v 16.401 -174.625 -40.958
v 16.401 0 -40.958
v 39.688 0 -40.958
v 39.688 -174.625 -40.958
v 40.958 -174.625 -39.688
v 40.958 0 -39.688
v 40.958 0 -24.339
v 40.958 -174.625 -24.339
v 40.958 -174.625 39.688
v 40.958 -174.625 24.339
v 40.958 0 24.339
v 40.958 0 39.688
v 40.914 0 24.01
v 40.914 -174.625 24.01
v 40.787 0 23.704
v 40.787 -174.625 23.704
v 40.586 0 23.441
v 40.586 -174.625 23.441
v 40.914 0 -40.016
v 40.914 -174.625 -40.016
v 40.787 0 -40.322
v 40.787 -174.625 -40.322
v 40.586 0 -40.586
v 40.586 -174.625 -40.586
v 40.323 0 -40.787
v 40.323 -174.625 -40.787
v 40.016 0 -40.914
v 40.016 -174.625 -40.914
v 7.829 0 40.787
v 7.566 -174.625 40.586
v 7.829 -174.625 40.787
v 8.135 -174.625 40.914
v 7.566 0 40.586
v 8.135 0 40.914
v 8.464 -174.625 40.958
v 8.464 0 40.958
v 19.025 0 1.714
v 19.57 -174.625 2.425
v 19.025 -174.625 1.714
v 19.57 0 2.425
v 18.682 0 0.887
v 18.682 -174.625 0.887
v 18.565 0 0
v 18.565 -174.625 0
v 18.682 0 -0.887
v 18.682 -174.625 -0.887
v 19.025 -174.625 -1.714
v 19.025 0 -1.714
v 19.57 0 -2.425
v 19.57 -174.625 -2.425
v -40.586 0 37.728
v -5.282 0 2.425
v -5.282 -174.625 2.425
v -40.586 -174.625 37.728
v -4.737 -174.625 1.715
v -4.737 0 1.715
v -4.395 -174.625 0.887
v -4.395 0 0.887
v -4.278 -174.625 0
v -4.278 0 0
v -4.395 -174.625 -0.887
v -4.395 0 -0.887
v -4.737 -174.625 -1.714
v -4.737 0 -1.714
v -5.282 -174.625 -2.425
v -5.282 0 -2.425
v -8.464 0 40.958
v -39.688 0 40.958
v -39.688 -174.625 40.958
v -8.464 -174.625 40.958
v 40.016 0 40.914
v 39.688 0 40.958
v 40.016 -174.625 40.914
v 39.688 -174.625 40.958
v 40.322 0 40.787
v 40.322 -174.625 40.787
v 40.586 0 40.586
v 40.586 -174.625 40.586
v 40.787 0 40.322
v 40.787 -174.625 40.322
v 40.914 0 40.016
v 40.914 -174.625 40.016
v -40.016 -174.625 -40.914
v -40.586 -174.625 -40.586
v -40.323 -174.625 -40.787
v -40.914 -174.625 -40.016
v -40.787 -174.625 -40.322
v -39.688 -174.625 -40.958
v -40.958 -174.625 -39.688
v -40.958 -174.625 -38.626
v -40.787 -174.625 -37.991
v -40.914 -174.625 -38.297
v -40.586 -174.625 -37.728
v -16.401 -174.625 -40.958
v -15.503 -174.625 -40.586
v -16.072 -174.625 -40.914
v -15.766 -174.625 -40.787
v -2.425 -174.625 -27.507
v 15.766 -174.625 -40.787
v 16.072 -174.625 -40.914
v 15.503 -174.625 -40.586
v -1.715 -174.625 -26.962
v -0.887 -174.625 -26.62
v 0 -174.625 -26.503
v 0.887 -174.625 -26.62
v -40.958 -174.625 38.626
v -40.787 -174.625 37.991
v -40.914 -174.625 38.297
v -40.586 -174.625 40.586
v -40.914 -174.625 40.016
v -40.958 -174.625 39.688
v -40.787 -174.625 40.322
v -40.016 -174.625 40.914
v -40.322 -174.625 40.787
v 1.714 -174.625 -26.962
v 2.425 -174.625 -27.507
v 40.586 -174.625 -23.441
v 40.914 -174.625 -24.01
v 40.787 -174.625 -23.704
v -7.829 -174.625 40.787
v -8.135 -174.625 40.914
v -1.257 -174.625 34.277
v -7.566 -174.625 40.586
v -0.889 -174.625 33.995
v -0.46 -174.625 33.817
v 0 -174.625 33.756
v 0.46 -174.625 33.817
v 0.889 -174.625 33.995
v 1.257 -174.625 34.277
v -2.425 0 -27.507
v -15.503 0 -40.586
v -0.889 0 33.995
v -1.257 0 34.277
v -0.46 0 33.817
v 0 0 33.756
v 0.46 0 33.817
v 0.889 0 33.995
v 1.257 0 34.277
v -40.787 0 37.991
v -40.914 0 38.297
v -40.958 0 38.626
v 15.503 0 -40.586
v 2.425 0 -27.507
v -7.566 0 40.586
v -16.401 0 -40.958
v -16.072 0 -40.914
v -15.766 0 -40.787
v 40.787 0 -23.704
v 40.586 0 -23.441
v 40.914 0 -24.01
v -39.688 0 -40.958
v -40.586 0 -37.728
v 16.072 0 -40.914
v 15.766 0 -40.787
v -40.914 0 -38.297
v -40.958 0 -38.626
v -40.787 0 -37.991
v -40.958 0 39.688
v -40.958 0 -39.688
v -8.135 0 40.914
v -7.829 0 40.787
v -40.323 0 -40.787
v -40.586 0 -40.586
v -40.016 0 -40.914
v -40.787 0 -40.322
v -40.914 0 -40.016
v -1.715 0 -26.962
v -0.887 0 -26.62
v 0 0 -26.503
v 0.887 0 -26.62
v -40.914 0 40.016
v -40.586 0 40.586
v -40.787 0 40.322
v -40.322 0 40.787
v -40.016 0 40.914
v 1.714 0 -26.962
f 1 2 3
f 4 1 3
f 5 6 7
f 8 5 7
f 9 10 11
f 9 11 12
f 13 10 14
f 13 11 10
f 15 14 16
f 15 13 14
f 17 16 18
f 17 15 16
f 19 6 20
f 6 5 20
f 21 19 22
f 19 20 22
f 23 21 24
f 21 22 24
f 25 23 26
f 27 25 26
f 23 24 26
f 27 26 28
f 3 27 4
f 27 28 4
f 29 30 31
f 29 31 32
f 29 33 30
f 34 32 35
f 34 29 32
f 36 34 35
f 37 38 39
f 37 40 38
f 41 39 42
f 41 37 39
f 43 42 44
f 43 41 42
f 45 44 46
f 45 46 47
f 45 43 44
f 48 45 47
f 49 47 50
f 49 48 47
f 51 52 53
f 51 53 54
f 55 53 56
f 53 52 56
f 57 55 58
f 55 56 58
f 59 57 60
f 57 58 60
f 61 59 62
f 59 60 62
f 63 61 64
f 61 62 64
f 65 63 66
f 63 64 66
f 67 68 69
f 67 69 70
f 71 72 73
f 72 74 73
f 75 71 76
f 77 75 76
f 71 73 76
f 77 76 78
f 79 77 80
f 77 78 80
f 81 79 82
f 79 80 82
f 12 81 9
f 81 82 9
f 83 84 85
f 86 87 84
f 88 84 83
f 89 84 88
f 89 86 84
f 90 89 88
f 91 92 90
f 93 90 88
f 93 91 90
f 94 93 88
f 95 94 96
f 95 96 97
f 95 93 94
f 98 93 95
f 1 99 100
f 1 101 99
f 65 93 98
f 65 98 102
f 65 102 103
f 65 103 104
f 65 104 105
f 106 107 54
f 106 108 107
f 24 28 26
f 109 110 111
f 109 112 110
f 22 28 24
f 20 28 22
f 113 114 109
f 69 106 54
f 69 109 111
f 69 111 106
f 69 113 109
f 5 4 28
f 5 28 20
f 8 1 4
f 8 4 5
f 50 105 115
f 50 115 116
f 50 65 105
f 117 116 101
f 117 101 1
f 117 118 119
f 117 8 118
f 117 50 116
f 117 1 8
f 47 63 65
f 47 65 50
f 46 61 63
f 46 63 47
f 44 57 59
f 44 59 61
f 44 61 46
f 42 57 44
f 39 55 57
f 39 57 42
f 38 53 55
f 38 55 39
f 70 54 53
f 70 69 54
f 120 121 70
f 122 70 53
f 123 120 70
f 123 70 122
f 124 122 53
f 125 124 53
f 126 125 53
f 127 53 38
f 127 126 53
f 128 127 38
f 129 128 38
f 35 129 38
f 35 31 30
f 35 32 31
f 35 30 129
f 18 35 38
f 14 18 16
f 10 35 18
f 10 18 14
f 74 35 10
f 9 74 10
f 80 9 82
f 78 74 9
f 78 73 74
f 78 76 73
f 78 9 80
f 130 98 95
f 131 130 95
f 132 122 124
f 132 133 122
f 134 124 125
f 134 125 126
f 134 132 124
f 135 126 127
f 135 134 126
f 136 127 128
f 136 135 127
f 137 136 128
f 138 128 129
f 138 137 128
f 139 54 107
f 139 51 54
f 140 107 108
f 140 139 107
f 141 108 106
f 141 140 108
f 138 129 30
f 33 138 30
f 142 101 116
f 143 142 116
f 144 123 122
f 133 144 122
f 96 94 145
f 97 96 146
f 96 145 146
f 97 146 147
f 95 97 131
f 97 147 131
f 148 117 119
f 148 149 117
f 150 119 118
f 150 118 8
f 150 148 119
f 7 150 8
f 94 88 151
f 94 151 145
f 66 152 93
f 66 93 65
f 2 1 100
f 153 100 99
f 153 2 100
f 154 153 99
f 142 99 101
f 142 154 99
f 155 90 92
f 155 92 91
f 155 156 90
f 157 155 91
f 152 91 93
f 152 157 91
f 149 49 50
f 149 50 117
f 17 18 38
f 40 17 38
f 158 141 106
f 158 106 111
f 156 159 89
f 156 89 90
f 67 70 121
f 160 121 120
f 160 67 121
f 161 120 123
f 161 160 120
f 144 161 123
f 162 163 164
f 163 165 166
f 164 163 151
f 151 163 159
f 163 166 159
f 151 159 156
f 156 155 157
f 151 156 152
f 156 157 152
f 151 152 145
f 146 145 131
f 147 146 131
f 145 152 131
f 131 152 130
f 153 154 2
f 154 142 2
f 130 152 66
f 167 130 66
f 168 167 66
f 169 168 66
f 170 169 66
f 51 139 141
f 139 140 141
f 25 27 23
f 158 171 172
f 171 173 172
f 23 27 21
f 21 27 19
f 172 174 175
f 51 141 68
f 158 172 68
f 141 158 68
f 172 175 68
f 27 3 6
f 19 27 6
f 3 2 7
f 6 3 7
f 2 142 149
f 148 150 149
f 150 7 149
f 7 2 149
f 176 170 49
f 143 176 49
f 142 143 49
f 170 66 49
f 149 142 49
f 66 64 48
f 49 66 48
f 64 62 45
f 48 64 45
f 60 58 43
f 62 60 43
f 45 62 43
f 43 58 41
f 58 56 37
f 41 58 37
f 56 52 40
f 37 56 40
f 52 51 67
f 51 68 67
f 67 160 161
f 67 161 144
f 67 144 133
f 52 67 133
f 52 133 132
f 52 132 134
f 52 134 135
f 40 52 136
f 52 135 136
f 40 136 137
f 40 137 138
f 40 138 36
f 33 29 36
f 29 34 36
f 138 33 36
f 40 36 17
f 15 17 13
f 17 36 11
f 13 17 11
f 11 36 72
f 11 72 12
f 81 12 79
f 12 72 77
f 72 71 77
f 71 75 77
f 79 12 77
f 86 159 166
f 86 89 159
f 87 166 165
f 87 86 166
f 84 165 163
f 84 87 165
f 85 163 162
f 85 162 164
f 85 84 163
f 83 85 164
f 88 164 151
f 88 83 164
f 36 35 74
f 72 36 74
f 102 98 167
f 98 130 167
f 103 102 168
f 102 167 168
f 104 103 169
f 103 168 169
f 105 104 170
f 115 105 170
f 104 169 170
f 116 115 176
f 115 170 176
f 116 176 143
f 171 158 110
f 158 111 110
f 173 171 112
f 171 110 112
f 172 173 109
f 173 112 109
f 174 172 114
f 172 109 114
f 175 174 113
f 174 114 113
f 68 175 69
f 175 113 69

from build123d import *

# Parameters (mm, degrees)
F0_W     = 81.915
F0_H     = 81.915
F1_DEPTH = 174.625
F3_DEPTH = 174.626
F5_DEPTH = 174.626
F7_DEPTH = 174.626
F9_DEPTH = 174.626
F10_R    = 1.27
F11_R    = 1.778
F12_R    = 3.429


with BuildPart() as f1:
    # F0 (on Front) → F1 (new body)
    with BuildSketch(Plane.XZ):
        Rectangle(F0_W, F0_H)
    extrude(amount=F1_DEPTH)

    # F2 (on face) → F3 (cut, through all)
    with BuildSketch(Plane.XZ.offset(174.625)):
        Polygon((7.9375, 40.9575), (-7.9375, 40.9575), (0, 33.02), align=None)
    extrude(amount=-F3_DEPTH, mode=Mode.SUBTRACT)

    # F4 (on face) → F5 (cut, through all)
    with BuildSketch(Plane.XZ.offset(174.625)):
        Polygon((0, -25.0825), (-15.875, -40.9575), (15.875, -40.9575), align=None)
    extrude(amount=-F5_DEPTH, mode=Mode.SUBTRACT)

    # F6 (on face) → F7 (cut, through all)
    with BuildSketch(Plane.XZ.offset(174.625)):
        Polygon((-2.8575, 0), (-40.9575, 38.1), (-40.9575, -38.1), align=None)
    extrude(amount=-F7_DEPTH, mode=Mode.SUBTRACT)

    # F8 (on face) → F9 (cut, through all)
    with BuildSketch(Plane.XZ.offset(174.625)):
        Polygon((40.9575, -23.8125), (40.9575, 23.8125), (17.145, 0), align=None)
    extrude(amount=-F9_DEPTH, mode=Mode.SUBTRACT)

    # F10
    f10_edges = [f1.edges().sort_by_distance(p)[0] for p in [
        (-7.9375, -87.3125, 40.9575),
        (7.9375, -87.3125, 40.9575),
        (40.9575, -87.3125, 40.9575),
        (40.9575, -87.3125, 23.8125),
        (40.9575, -87.3125, -23.8125),
        (40.9575, -87.3125, -40.9575),
        (15.875, -87.3125, -40.9575),
        (-15.875, -87.3125, -40.9575),
        (-40.9575, -87.3125, -40.9575),
        (-40.9575, -87.3125, -38.1),
        (-40.9575, -87.3125, 38.1),
        (-40.9575, -87.3125, 40.9575),
    ]]
    fillet(f10_edges, radius=F10_R)

    # F11
    f11_edges = [f1.edges().sort_by_distance(p)[0] for p in [
        (0, -87.3125, 33.02),
    ]]
    fillet(f11_edges, radius=F11_R)

    # F12
    f12_edges = [f1.edges().sort_by_distance(p)[0] for p in [
        (0, -87.3125, -25.0825),
        (17.145, -87.3125, 0),
        (-2.8575, -87.3125, 0),
    ]]
    fillet(f12_edges, radius=F12_R)


solid = f1.part
